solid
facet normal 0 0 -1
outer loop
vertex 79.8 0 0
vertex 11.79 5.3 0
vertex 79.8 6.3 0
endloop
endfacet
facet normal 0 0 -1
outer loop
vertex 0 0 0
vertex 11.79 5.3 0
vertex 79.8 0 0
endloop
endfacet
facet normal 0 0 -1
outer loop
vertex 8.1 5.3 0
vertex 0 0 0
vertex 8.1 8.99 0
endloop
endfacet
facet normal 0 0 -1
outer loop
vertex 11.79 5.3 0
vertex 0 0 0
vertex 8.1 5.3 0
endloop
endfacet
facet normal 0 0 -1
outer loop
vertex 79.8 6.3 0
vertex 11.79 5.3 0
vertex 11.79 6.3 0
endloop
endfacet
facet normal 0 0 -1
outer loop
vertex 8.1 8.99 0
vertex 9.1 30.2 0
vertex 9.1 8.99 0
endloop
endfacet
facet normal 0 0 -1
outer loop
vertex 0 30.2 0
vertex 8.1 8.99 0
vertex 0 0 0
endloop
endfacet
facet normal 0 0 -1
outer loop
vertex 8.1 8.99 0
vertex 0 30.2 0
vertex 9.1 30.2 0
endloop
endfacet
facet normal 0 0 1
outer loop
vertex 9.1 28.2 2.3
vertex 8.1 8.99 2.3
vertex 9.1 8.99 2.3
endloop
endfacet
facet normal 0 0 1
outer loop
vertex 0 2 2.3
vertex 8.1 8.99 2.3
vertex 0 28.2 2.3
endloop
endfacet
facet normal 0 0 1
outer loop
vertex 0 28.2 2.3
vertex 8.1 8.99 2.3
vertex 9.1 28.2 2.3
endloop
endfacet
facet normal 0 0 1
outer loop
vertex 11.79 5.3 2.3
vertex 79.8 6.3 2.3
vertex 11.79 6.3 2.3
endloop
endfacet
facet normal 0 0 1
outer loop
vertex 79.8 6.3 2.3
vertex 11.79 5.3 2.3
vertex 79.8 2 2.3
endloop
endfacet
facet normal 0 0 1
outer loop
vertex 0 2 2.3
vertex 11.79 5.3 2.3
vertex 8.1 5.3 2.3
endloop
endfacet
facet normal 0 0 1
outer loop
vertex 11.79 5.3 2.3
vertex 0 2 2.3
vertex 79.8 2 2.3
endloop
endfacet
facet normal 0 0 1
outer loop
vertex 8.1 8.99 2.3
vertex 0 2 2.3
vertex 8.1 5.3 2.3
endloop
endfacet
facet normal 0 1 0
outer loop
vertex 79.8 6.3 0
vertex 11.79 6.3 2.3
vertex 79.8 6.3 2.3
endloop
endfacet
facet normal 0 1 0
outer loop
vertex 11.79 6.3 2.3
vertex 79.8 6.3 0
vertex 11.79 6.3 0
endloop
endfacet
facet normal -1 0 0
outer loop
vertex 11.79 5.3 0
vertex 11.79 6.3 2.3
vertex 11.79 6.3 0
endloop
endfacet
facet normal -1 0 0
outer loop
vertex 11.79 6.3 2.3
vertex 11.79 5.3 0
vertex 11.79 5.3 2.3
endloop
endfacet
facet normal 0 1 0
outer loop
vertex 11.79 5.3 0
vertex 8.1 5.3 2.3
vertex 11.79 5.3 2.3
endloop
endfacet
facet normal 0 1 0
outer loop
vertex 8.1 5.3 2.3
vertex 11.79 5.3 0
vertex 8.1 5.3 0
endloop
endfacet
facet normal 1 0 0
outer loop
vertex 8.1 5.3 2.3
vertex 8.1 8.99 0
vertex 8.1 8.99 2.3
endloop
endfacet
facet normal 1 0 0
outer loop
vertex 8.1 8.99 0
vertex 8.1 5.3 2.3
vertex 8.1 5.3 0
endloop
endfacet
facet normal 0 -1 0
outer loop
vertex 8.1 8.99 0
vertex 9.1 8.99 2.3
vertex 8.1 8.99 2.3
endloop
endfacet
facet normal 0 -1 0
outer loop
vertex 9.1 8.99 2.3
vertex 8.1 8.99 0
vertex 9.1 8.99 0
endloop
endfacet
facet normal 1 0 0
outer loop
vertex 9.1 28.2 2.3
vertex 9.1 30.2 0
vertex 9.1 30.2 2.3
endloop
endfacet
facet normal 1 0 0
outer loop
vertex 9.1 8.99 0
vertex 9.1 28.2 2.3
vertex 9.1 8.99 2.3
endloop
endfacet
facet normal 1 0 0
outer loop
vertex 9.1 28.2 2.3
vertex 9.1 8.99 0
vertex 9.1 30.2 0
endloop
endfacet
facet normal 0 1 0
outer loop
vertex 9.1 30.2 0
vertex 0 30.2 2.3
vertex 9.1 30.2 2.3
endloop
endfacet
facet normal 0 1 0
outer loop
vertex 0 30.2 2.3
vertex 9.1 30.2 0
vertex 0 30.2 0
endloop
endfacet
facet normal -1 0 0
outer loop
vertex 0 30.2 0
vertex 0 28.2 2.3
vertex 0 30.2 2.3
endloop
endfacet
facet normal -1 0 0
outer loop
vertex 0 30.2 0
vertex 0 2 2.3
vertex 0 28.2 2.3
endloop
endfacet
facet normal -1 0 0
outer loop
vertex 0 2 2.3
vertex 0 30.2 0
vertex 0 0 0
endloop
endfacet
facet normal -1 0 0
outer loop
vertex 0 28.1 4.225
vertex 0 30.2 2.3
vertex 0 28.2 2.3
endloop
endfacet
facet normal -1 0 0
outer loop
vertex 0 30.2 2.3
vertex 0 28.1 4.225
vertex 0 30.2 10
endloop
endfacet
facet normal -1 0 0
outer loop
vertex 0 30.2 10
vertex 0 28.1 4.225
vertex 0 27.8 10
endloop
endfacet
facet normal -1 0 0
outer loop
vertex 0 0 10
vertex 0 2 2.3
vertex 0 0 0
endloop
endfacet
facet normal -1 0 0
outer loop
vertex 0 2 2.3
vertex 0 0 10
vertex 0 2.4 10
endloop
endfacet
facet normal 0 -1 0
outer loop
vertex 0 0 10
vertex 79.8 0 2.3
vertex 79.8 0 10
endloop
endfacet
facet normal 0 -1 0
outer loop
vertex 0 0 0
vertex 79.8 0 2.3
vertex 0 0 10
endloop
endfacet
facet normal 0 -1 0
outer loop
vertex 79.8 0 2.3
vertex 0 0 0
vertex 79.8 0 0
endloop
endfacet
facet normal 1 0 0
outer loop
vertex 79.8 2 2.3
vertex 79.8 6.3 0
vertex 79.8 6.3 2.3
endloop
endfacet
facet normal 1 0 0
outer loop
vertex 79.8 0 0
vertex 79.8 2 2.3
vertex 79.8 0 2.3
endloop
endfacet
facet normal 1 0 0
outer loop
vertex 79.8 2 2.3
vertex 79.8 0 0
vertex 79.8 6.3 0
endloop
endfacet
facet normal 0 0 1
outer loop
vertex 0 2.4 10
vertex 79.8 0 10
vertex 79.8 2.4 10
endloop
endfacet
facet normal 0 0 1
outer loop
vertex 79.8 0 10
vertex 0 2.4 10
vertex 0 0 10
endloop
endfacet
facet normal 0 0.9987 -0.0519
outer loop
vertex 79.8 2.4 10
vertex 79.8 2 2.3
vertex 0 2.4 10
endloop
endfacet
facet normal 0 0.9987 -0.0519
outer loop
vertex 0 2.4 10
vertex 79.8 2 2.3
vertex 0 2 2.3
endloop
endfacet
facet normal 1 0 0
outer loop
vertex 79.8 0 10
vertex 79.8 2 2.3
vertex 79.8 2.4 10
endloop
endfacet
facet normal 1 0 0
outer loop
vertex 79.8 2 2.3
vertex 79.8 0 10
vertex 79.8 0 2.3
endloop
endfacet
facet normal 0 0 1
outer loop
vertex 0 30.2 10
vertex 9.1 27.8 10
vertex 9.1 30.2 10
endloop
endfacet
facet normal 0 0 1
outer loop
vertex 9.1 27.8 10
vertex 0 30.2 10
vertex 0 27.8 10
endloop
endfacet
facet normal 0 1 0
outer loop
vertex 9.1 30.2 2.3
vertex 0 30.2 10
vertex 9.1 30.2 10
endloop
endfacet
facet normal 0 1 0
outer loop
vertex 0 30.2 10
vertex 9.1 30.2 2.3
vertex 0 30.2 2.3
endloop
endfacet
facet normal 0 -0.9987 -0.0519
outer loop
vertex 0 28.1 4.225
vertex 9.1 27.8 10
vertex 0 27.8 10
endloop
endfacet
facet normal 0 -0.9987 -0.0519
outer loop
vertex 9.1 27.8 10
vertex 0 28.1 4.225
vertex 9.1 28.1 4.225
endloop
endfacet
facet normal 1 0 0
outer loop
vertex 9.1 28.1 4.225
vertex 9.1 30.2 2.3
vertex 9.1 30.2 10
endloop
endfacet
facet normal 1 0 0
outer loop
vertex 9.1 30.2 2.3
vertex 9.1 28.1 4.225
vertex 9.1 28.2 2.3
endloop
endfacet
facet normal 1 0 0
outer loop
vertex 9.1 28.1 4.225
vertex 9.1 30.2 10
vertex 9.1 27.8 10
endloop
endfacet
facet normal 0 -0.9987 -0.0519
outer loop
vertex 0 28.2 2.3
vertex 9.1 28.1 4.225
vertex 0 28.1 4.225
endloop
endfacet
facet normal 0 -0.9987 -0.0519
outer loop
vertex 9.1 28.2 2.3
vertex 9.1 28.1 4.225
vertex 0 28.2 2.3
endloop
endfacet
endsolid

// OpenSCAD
// file: ../flap_dimensions.scad
/*
   Copyright 2018 Scott Bezek and the splitflap contributors

   Licensed under the Apache License, Version 2.0 (the "License");
   you may not use this file except in compliance with the License.
   You may obtain a copy of the License at

       http://www.apache.org/licenses/LICENSE-2.0

   Unless required by applicable law or agreed to in writing, software
   distributed under the License is distributed on an "AS IS" BASIS,
   WITHOUT WARRANTIES OR CONDITIONS OF ANY KIND, either express or implied.
   See the License for the specific language governing permissions and
   limitations under the License.
*/

flap_width = 70.5;
flap_height = 26;
flap_thickness = 0.3; // 30 mil
flap_corner_radius = 3.1; // 2.88-3.48mm (used just for display)

flap_notch_height_auto = false;
flap_notch_height_default = 7.2;

flap_notch_height = (flap_notch_height_auto == true) ? sqrt(spool_outer_radius*spool_outer_radius - flap_pitch_radius*flap_pitch_radius) : flap_notch_height_default;

flap_notch_depth = 2;

flap_pin_width = 1.2;
// main file
/*
   Copyright 2018 Scott Bezek and the splitflap contributors

   Licensed under the Apache License, Version 2.0 (the "License");
   you may not use this file except in compliance with the License.
   You may obtain a copy of the License at

       http://www.apache.org/licenses/LICENSE-2.0

   Unless required by applicable law or agreed to in writing, software
   distributed under the License is distributed on an "AS IS" BASIS,
   WITHOUT WARRANTIES OR CONDITIONS OF ANY KIND, either express or implied.
   See the License for the specific language governing permissions and
   limitations under the License.
*/

include<../flap_dimensions.scad>;

print_tolerance = 0.1;
jig_thickness = 2;

clamp_inset = 0.4;

punch_width = 26;
punch_lower_height = 7.7;
punch_gap_height = 2.5;
slot_inset_depth = 9.3;
slot_depth = 3;
slot_width = 15;

eps = 0.1;

jig_length = flap_width + slot_inset_depth;
flap_void_width = flap_width + slot_depth + print_tolerance*2 + eps;
flap_void_height = jig_thickness + print_tolerance + flap_height - (punch_width - slot_width)/2 + flap_pin_width + print_tolerance + eps;
flap_corner_relief = 0.05; // as multiplier of flap void

union() {
    linear_extrude(height=punch_gap_height - print_tolerance*2) {
        difference() {
            square([jig_length, jig_thickness*2 + print_tolerance*2 + flap_height]);
            translate([slot_inset_depth - print_tolerance*2, jig_thickness + print_tolerance + (punch_width - slot_width)/2 - flap_pin_width - print_tolerance]) {
                union() {
                    square([flap_void_width, flap_void_height]);
                    // create relief for flap corner
                    translate([-1,-1]) {
                        square([flap_void_width*flap_corner_relief, flap_void_width*flap_corner_relief]);
                    }
                }

            }
        }
    }

    // create support for right side of punch
    translate([0, 0, punch_gap_height - print_tolerance*2]) {
        linear_extrude(height=punch_lower_height, scale=[1, (jig_thickness + clamp_inset)/jig_thickness]) {
            square([jig_length, jig_thickness]);
        }
    }

    // create support for left side of punch
    translate([0, jig_thickness*2 + print_tolerance*2 + punch_width, punch_gap_height - print_tolerance*2]) {
        linear_extrude(height=punch_lower_height, scale=[1, (jig_thickness + clamp_inset)/jig_thickness]) {
            translate([0, -jig_thickness]) {
                square([slot_inset_depth - print_tolerance*2, jig_thickness]);
            }
        }
    }
}


%translate([slot_inset_depth, jig_thickness + print_tolerance + (punch_width - slot_width)/2, -8]) {
    cube([slot_depth, slot_width, 16]);
}
